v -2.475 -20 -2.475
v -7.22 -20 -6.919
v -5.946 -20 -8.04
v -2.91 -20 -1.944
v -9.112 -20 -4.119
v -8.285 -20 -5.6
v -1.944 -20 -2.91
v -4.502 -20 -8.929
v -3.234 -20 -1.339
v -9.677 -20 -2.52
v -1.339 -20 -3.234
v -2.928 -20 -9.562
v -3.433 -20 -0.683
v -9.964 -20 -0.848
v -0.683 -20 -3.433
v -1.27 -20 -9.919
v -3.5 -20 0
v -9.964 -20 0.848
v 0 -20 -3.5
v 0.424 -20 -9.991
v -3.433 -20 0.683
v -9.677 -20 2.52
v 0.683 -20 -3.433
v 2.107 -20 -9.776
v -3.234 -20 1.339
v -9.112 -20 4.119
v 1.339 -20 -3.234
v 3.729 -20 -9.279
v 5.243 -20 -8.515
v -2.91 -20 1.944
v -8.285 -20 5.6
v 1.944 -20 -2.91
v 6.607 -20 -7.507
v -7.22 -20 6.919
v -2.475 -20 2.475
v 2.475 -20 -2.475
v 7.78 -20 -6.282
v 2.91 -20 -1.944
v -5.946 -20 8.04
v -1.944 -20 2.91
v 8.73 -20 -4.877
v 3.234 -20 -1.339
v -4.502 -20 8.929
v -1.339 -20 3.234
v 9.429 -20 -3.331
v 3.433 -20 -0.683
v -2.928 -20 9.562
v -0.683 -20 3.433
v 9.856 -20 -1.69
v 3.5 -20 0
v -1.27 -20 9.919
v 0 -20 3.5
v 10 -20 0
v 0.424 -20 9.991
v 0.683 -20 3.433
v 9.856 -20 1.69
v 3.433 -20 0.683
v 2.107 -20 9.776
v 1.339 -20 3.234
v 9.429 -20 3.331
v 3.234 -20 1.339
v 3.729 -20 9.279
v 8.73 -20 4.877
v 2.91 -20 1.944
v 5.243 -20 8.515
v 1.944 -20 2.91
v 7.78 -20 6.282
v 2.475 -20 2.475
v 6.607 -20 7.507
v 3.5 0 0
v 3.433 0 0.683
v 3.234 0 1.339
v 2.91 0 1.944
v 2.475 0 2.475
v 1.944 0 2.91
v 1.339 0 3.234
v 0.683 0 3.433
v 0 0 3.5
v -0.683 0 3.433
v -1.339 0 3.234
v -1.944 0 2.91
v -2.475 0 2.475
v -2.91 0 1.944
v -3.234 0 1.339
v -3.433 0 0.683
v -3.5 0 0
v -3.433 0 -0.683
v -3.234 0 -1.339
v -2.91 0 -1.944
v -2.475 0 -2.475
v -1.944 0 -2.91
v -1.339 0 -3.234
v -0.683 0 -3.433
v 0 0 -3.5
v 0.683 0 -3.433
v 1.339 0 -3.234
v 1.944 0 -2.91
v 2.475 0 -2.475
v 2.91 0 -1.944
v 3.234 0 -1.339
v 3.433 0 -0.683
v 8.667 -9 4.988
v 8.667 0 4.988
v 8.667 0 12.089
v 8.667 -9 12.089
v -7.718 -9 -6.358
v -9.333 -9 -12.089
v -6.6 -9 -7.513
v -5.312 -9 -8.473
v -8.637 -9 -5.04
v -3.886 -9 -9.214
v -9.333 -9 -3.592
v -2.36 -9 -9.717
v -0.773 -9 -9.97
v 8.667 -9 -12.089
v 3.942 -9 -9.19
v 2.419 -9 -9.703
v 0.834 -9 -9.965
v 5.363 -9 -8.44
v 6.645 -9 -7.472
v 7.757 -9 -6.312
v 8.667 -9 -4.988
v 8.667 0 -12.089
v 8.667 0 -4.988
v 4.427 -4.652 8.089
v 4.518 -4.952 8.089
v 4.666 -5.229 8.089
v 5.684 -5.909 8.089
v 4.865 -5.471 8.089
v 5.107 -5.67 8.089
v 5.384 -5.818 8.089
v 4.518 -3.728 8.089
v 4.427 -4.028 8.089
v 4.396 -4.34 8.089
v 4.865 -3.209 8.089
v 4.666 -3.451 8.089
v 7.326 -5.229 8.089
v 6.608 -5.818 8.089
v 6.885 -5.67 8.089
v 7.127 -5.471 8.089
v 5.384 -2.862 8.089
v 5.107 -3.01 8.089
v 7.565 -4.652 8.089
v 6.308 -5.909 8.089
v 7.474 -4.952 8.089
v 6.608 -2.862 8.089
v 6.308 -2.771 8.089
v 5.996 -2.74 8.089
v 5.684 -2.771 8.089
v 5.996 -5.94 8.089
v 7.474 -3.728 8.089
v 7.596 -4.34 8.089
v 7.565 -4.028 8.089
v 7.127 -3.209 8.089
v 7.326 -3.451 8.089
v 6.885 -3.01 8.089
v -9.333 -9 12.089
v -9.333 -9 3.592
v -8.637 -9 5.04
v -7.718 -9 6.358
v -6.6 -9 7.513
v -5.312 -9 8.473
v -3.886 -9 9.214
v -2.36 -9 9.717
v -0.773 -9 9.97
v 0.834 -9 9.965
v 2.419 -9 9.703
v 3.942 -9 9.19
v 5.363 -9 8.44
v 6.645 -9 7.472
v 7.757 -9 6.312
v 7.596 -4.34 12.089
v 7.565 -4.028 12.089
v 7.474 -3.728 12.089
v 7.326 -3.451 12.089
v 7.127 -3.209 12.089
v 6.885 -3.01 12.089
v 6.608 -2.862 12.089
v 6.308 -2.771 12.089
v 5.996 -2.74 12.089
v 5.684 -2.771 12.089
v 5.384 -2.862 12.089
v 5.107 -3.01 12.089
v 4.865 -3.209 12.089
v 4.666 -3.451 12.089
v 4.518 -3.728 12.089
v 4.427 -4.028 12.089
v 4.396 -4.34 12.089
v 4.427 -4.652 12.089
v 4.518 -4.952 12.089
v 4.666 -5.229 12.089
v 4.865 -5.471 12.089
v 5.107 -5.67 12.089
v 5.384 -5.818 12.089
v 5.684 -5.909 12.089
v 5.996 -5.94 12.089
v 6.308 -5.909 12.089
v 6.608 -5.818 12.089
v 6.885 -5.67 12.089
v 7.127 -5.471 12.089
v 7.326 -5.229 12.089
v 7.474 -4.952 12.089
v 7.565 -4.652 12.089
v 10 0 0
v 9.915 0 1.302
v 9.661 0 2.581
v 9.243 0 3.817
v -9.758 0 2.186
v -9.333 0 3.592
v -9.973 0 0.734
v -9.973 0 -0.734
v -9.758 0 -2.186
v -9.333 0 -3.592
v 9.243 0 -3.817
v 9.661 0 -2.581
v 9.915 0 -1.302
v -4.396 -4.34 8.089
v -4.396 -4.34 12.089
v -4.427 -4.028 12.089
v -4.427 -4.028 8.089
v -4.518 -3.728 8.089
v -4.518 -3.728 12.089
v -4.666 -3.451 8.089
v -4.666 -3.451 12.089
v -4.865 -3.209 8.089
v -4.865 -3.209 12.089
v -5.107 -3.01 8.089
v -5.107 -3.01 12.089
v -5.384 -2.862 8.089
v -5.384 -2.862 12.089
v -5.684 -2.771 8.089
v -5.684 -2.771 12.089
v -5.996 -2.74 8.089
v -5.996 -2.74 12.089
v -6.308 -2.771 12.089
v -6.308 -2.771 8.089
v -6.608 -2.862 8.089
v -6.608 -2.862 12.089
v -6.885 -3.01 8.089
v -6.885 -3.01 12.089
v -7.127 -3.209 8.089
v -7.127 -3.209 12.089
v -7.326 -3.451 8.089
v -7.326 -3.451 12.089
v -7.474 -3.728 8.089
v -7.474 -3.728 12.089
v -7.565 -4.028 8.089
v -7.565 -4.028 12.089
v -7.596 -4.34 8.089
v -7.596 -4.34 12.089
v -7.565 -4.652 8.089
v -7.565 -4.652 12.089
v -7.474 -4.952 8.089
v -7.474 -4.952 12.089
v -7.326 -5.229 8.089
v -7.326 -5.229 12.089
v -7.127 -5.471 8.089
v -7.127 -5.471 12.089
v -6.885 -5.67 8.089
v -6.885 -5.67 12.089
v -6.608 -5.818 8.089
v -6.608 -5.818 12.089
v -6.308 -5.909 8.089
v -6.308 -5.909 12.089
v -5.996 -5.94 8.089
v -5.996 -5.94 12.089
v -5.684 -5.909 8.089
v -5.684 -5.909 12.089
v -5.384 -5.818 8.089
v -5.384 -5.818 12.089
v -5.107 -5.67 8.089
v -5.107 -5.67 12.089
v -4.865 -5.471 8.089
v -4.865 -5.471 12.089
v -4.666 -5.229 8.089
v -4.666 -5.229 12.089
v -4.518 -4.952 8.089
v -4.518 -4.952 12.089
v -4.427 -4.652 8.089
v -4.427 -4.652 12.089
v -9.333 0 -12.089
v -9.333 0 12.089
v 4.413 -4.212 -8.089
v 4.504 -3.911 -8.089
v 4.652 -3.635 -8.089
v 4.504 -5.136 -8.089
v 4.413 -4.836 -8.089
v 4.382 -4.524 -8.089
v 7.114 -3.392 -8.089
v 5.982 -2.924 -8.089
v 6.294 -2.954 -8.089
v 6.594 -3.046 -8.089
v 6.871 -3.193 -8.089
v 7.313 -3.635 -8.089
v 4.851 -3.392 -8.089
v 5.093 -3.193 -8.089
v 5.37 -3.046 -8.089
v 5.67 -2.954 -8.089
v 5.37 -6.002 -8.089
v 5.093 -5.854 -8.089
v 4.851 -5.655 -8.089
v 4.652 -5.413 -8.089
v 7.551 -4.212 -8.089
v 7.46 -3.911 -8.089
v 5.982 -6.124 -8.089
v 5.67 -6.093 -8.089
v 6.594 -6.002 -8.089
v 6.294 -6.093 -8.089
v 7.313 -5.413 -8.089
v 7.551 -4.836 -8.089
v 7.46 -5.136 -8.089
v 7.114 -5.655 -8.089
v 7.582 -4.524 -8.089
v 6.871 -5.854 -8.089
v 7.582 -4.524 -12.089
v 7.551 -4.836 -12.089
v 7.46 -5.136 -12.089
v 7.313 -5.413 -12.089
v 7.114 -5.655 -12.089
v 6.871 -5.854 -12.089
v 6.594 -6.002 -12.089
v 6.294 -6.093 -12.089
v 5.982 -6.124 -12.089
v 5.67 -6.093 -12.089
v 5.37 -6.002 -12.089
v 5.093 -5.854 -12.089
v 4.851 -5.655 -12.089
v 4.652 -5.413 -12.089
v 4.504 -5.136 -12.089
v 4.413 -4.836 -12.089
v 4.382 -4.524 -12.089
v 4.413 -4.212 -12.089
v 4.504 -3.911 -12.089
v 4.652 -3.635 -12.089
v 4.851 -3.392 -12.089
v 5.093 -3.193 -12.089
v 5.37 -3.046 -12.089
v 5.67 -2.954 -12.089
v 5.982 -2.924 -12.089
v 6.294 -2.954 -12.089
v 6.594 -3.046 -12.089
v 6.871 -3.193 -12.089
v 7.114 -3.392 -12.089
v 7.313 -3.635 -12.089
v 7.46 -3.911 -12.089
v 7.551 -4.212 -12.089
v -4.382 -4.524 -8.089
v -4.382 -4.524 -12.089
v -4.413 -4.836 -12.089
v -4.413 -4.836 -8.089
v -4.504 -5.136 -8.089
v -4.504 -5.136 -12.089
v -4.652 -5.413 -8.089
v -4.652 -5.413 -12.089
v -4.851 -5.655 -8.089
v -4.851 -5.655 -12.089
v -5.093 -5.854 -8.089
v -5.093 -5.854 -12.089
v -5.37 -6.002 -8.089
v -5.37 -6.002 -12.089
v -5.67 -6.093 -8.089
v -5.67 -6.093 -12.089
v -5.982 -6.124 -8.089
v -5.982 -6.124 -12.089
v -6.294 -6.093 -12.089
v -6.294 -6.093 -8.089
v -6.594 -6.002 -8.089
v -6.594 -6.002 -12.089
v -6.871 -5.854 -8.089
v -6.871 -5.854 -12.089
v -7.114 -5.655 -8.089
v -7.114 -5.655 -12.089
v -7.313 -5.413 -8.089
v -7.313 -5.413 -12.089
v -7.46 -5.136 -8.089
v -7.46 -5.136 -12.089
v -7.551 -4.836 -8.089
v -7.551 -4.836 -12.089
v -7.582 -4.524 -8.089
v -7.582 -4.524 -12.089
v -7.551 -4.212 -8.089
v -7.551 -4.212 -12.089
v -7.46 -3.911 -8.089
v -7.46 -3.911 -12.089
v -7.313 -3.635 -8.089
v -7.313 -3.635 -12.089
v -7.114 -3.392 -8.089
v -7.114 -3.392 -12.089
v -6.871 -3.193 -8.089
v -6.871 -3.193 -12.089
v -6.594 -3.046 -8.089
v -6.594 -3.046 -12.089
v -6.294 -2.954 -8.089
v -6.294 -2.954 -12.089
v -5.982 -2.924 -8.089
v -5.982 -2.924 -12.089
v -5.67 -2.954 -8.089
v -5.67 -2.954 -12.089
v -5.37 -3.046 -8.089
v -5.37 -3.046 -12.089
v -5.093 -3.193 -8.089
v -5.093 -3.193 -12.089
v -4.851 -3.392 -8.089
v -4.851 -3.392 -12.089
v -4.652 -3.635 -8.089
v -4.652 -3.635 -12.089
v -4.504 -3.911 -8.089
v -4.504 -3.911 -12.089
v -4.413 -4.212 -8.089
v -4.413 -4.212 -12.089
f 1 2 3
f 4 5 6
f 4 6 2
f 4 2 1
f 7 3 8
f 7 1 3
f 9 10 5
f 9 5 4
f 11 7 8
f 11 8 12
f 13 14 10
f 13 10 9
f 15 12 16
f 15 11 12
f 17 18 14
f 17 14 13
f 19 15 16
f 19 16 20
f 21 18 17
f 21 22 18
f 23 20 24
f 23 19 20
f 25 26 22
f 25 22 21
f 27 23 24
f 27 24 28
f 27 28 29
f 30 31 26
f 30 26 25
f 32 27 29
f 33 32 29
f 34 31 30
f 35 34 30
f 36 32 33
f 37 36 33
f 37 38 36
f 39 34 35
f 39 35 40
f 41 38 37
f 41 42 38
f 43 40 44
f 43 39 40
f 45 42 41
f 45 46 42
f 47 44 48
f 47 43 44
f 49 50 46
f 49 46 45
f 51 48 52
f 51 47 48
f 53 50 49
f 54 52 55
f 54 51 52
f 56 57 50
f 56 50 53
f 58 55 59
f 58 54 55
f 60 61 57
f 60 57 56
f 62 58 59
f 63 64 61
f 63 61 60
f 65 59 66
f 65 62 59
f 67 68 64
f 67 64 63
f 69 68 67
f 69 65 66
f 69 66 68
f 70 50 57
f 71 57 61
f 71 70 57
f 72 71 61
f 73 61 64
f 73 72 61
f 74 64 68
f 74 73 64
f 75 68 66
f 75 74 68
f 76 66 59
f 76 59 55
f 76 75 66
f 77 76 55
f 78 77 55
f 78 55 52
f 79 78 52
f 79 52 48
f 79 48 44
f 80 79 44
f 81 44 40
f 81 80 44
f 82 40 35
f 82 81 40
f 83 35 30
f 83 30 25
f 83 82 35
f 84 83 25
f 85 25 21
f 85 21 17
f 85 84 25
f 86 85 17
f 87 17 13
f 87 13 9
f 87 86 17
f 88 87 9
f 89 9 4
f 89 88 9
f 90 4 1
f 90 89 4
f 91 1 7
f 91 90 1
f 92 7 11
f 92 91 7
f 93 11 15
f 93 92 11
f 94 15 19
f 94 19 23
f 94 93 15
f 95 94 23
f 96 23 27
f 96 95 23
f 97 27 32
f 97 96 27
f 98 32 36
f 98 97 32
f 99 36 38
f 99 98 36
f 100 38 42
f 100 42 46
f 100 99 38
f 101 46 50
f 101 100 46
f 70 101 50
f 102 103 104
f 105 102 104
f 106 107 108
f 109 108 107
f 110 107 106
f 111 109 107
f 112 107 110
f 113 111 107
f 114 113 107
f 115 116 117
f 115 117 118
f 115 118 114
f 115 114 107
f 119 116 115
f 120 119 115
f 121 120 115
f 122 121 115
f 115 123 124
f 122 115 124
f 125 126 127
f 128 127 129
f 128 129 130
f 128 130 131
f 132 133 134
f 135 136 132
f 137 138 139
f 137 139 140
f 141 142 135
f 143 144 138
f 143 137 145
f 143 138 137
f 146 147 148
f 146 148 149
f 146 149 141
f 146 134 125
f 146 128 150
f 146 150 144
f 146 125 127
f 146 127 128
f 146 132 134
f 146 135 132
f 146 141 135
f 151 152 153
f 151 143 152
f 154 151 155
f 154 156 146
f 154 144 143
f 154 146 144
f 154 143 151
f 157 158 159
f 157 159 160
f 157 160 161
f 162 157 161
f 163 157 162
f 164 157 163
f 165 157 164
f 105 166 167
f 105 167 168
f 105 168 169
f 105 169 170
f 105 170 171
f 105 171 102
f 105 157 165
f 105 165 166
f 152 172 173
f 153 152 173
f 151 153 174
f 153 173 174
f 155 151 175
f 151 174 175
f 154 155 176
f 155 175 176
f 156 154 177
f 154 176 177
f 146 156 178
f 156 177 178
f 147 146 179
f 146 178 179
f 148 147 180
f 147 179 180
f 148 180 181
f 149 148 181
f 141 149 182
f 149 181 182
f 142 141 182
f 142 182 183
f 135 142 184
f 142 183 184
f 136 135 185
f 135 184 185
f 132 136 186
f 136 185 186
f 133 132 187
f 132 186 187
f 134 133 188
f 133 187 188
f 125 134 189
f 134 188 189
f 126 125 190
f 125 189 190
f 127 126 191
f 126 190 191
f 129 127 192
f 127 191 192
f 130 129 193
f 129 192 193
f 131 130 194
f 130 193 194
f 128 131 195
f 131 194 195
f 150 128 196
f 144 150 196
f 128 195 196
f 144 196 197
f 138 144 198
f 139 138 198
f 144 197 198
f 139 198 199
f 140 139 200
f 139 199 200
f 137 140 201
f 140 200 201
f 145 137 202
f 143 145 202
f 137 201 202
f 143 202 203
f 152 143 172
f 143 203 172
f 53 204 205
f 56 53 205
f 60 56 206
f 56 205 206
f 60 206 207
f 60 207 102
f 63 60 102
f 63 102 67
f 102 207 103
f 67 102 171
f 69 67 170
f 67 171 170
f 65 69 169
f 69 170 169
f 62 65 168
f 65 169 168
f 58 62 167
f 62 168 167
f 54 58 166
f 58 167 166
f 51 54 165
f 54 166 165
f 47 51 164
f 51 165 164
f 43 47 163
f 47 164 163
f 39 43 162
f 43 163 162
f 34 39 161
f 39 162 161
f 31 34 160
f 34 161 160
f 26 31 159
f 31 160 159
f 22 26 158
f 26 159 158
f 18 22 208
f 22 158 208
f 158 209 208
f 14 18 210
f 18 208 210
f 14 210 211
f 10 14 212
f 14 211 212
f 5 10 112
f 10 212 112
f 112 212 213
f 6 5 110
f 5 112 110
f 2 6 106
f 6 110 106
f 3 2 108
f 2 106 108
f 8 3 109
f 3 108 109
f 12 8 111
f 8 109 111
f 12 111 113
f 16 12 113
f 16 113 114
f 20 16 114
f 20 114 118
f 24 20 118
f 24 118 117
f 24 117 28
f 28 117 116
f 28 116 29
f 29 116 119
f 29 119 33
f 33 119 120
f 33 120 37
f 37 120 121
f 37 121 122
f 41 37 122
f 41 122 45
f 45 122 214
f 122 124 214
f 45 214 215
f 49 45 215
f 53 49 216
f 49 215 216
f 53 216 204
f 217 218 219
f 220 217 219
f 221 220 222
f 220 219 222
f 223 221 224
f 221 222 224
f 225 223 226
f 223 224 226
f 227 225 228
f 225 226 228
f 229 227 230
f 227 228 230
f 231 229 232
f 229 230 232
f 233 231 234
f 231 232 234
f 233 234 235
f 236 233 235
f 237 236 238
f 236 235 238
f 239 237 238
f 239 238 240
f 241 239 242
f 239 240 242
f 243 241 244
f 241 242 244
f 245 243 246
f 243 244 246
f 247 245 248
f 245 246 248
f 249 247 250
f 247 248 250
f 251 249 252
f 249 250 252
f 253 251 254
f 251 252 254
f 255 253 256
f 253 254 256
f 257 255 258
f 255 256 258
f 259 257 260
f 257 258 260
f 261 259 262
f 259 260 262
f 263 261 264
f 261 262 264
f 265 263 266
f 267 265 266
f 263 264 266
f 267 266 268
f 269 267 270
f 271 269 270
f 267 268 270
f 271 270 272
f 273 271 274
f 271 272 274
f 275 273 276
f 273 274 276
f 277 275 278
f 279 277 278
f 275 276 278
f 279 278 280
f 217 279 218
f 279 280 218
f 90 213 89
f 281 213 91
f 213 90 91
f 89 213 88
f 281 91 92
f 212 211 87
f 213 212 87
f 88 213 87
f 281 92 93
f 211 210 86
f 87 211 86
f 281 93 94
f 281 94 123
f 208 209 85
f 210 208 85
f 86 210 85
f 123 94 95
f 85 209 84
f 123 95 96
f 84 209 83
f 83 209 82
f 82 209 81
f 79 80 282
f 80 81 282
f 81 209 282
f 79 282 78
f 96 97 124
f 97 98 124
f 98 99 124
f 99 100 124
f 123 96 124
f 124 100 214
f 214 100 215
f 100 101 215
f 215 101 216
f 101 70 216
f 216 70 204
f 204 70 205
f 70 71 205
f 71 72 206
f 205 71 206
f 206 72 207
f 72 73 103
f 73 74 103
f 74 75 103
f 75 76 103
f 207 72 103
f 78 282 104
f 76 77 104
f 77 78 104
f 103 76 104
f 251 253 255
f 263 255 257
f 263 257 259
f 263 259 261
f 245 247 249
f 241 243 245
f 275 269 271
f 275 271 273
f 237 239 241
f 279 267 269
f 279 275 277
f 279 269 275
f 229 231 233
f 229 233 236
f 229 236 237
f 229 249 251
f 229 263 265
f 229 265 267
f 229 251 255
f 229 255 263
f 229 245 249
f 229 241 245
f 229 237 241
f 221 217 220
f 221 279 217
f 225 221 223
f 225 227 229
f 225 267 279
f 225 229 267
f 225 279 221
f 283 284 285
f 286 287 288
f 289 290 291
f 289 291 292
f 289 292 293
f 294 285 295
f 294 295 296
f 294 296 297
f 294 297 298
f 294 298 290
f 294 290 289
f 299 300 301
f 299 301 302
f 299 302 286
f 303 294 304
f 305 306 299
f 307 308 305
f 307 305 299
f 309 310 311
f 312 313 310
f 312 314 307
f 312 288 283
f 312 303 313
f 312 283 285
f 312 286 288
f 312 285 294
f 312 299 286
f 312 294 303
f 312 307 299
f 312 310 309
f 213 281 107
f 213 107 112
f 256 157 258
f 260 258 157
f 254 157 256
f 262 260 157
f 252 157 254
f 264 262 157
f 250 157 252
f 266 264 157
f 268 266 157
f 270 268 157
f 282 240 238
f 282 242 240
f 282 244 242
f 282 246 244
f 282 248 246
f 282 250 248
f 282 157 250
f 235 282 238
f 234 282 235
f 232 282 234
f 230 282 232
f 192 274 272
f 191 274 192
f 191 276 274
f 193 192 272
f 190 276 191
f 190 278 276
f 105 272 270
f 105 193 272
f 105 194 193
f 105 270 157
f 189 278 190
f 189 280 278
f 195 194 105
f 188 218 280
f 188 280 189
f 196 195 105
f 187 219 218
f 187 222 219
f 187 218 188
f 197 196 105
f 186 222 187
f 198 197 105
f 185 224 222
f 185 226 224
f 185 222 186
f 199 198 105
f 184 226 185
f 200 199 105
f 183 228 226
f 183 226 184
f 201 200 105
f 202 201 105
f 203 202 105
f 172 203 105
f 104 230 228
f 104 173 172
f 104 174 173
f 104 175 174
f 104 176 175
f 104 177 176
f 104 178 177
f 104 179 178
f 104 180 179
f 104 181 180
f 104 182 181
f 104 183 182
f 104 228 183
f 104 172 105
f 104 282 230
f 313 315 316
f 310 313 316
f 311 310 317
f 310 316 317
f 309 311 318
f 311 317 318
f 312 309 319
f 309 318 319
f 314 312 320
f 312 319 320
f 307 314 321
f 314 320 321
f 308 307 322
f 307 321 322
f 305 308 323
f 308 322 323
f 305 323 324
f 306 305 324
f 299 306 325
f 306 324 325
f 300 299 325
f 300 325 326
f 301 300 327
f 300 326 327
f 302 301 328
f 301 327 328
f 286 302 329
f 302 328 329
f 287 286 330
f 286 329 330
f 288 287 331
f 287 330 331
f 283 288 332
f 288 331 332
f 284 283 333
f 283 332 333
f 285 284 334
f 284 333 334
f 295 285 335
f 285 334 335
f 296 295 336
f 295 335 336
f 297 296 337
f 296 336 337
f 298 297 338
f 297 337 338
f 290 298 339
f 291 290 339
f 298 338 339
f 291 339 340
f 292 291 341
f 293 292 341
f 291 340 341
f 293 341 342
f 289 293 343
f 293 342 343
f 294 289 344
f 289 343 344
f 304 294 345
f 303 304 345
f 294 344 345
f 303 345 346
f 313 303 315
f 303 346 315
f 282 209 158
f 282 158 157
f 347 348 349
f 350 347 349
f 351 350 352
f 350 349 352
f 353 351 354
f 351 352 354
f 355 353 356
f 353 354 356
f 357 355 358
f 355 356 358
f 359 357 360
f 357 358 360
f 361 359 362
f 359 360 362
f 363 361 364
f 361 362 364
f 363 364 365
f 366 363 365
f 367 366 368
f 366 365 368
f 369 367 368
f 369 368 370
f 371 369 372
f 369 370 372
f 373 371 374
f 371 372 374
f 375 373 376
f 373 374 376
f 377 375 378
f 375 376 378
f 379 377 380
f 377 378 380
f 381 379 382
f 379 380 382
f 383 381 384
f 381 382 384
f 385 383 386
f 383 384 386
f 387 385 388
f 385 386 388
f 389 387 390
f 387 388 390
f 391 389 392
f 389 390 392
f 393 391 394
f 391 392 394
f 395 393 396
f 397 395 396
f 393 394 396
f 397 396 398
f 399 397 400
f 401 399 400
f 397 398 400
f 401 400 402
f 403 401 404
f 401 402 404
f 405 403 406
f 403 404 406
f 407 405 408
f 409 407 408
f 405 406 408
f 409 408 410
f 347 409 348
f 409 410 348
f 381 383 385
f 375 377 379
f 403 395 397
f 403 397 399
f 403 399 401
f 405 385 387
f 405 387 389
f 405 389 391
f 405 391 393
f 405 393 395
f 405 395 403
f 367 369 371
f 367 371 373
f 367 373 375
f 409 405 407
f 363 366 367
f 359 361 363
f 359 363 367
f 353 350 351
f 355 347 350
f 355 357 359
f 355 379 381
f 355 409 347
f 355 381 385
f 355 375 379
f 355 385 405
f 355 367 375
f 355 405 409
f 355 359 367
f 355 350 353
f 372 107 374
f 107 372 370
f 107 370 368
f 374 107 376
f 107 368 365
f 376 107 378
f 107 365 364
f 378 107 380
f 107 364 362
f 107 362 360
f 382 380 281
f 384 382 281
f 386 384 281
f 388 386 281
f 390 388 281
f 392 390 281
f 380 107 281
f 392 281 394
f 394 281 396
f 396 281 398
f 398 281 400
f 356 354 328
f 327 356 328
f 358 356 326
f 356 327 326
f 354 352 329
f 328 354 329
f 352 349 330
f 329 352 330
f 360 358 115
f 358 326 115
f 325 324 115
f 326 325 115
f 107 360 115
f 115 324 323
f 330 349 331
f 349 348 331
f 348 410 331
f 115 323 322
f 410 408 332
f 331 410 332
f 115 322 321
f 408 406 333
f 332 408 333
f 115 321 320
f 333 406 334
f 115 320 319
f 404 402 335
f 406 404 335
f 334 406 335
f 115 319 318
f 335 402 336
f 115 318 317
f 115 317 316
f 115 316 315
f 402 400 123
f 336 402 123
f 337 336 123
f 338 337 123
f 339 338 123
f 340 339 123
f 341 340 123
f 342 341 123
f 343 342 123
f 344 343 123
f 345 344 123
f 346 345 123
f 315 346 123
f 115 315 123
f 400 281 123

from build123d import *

# Parameters (mm, degrees)
F0_R     = 10
F0_R_2   = 3.5
F1_DEPTH = 20
F2_W     = 18
F2_H     = 8.5
F3_DEPTH = 9
F4_R     = 1.6
F5_DEPTH = 4
F6_R     = 1.6
F7_DEPTH = 4


with BuildPart() as f1:
    # F0 (on Front) → F1 (new body)
    with BuildSketch(Plane.XZ):
        Circle(F0_R)
        Circle(F0_R_2, mode=Mode.SUBTRACT)
    extrude(amount=F1_DEPTH)

    # F2 (on Front) → F3 (join)
    with BuildSketch(Plane.XZ):
        with Locations((-0.332717, 7.839034)):
            Rectangle(F2_W, F2_H)
        with Locations((-0.332717, -7.839034)):
            Rectangle(F2_W, F2_H)
    extrude(amount=F3_DEPTH)

    # F4 (on face) → F5 (cut)
    with BuildSketch(Plane.XY.offset(12.089034)):
        with Locations((-5.996018, -4.33991)):
            Circle(F4_R)
        with Locations((5.996018, -4.33991)):
            Circle(F4_R)
    extrude(amount=-F5_DEPTH, mode=Mode.SUBTRACT)

    # F6 (on face) → F7 (cut)
    with BuildSketch(Plane(origin=(0, 0, -12.089034), x_dir=(1, 0, 0), z_dir=(0, 0, -1))):
        with Locations((5.982172, 4.523708)):
            Circle(F6_R)
        with Locations((-5.982172, 4.523708)):
            Circle(F6_R)
    extrude(amount=-F7_DEPTH, mode=Mode.SUBTRACT)


solid = f1.part
